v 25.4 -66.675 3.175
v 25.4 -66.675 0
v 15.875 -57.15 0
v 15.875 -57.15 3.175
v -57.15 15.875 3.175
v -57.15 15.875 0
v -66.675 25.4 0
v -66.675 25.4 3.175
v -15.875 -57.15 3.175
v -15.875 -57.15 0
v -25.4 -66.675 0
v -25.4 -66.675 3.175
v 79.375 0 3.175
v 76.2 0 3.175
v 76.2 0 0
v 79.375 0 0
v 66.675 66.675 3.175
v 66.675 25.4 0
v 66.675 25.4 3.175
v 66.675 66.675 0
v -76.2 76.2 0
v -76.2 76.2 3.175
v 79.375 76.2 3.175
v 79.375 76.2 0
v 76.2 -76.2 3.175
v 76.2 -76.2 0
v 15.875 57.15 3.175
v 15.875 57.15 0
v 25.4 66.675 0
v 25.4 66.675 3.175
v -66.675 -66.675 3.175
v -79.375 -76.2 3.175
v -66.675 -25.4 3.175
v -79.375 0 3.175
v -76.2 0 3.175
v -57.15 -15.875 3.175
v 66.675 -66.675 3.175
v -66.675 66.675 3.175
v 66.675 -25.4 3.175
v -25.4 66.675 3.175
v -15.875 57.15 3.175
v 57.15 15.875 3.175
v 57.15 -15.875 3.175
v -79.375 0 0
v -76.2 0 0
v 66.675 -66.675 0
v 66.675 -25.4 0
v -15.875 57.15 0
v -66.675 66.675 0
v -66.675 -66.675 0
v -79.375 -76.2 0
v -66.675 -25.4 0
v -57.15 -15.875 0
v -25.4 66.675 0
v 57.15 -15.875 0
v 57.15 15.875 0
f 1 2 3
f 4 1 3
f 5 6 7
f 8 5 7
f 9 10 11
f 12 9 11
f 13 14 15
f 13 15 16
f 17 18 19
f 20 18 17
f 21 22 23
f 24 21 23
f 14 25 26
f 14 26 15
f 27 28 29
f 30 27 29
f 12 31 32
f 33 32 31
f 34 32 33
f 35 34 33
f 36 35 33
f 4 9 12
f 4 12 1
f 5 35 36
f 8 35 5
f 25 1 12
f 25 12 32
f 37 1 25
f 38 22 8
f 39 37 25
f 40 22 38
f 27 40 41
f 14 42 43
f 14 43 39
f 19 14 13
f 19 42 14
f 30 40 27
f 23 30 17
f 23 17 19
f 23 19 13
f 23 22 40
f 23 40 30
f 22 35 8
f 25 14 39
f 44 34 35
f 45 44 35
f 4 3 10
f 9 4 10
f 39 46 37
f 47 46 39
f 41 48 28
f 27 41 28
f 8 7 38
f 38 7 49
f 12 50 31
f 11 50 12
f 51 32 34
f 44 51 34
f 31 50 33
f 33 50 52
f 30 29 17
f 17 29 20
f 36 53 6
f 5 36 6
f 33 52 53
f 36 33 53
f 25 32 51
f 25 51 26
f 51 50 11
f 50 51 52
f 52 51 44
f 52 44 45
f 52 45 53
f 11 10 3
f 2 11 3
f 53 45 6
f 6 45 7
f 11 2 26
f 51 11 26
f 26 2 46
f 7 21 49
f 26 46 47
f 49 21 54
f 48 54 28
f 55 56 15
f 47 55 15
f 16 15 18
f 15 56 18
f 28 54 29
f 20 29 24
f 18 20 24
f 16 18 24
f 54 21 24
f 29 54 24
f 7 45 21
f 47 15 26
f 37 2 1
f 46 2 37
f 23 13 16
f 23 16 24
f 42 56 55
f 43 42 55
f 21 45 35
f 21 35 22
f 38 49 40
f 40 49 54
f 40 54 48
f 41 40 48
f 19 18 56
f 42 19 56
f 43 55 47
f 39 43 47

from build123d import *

# Parameters (mm, degrees)
SKETCH1_W           = 152.4
SKETCH1_H           = 152.4
SKETCH1_W_2         = 133.35
SKETCH1_H_2         = 133.35
BOSS_EXTRUDE1_DEPTH = 3.175
SKETCH2_W           = 3.175
SKETCH2_H           = 152.4
BOSS_EXTRUDE4_DEPTH = 3.175
SKETCH3_W           = 3.175
SKETCH3_H           = 76.2
BOSS_EXTRUDE5_DEPTH = 3.175
SKETCH4_W           = 3.175
SKETCH4_H           = 76.2
CUT_EXTRUDE1_DEPTH  = 3.175


with BuildPart() as part:
    # Sketch1 → Boss-Extrude1 (new body)
    with BuildSketch(Plane.XY):
        Rectangle(SKETCH1_W, SKETCH1_H)
        Rectangle(SKETCH1_W_2, SKETCH1_H_2, mode=Mode.SUBTRACT)
        Polygon((25.4, 66.675), (-25.4, 66.675), (-15.875, 57.15), (15.875, 57.15), align=None)
        Polygon((66.675, -25.4), (66.675, 25.4), (57.15, 15.875), (57.15, -15.875), align=None)
        Polygon((-15.875, -57.15), (-25.4, -66.675), (25.4, -66.675), (15.875, -57.15), align=None)
        Polygon((-57.15, 15.875), (-66.675, 25.4), (-66.675, -25.4), (-57.15, -15.875), align=None)
    extrude(amount=BOSS_EXTRUDE1_DEPTH)

    # Sketch2 → Boss-Extrude4 (add)
    with BuildSketch(Plane.XY.offset(3.175)):
        with Locations((77.7875, 0)):
            Rectangle(SKETCH2_W, SKETCH2_H)
    extrude(amount=-BOSS_EXTRUDE4_DEPTH)

    # Sketch3 → Boss-Extrude5 (add)
    with BuildSketch(Plane.XY.offset(3.175)):
        with Locations((77.7875, 38.1)):
            Rectangle(SKETCH3_W, SKETCH3_H)
        with Locations((-77.7875, -38.1)):
            Rectangle(SKETCH3_W, SKETCH3_H)
    extrude(amount=-BOSS_EXTRUDE5_DEPTH)

    # Sketch4 → Cut-Extrude1 (cut)
    with BuildSketch(Plane.XY.offset(3.175)):
        with Locations((77.7875, -38.1)):
            Rectangle(SKETCH4_W, SKETCH4_H)
    extrude(amount=-CUT_EXTRUDE1_DEPTH, mode=Mode.SUBTRACT)


solid = part.part
